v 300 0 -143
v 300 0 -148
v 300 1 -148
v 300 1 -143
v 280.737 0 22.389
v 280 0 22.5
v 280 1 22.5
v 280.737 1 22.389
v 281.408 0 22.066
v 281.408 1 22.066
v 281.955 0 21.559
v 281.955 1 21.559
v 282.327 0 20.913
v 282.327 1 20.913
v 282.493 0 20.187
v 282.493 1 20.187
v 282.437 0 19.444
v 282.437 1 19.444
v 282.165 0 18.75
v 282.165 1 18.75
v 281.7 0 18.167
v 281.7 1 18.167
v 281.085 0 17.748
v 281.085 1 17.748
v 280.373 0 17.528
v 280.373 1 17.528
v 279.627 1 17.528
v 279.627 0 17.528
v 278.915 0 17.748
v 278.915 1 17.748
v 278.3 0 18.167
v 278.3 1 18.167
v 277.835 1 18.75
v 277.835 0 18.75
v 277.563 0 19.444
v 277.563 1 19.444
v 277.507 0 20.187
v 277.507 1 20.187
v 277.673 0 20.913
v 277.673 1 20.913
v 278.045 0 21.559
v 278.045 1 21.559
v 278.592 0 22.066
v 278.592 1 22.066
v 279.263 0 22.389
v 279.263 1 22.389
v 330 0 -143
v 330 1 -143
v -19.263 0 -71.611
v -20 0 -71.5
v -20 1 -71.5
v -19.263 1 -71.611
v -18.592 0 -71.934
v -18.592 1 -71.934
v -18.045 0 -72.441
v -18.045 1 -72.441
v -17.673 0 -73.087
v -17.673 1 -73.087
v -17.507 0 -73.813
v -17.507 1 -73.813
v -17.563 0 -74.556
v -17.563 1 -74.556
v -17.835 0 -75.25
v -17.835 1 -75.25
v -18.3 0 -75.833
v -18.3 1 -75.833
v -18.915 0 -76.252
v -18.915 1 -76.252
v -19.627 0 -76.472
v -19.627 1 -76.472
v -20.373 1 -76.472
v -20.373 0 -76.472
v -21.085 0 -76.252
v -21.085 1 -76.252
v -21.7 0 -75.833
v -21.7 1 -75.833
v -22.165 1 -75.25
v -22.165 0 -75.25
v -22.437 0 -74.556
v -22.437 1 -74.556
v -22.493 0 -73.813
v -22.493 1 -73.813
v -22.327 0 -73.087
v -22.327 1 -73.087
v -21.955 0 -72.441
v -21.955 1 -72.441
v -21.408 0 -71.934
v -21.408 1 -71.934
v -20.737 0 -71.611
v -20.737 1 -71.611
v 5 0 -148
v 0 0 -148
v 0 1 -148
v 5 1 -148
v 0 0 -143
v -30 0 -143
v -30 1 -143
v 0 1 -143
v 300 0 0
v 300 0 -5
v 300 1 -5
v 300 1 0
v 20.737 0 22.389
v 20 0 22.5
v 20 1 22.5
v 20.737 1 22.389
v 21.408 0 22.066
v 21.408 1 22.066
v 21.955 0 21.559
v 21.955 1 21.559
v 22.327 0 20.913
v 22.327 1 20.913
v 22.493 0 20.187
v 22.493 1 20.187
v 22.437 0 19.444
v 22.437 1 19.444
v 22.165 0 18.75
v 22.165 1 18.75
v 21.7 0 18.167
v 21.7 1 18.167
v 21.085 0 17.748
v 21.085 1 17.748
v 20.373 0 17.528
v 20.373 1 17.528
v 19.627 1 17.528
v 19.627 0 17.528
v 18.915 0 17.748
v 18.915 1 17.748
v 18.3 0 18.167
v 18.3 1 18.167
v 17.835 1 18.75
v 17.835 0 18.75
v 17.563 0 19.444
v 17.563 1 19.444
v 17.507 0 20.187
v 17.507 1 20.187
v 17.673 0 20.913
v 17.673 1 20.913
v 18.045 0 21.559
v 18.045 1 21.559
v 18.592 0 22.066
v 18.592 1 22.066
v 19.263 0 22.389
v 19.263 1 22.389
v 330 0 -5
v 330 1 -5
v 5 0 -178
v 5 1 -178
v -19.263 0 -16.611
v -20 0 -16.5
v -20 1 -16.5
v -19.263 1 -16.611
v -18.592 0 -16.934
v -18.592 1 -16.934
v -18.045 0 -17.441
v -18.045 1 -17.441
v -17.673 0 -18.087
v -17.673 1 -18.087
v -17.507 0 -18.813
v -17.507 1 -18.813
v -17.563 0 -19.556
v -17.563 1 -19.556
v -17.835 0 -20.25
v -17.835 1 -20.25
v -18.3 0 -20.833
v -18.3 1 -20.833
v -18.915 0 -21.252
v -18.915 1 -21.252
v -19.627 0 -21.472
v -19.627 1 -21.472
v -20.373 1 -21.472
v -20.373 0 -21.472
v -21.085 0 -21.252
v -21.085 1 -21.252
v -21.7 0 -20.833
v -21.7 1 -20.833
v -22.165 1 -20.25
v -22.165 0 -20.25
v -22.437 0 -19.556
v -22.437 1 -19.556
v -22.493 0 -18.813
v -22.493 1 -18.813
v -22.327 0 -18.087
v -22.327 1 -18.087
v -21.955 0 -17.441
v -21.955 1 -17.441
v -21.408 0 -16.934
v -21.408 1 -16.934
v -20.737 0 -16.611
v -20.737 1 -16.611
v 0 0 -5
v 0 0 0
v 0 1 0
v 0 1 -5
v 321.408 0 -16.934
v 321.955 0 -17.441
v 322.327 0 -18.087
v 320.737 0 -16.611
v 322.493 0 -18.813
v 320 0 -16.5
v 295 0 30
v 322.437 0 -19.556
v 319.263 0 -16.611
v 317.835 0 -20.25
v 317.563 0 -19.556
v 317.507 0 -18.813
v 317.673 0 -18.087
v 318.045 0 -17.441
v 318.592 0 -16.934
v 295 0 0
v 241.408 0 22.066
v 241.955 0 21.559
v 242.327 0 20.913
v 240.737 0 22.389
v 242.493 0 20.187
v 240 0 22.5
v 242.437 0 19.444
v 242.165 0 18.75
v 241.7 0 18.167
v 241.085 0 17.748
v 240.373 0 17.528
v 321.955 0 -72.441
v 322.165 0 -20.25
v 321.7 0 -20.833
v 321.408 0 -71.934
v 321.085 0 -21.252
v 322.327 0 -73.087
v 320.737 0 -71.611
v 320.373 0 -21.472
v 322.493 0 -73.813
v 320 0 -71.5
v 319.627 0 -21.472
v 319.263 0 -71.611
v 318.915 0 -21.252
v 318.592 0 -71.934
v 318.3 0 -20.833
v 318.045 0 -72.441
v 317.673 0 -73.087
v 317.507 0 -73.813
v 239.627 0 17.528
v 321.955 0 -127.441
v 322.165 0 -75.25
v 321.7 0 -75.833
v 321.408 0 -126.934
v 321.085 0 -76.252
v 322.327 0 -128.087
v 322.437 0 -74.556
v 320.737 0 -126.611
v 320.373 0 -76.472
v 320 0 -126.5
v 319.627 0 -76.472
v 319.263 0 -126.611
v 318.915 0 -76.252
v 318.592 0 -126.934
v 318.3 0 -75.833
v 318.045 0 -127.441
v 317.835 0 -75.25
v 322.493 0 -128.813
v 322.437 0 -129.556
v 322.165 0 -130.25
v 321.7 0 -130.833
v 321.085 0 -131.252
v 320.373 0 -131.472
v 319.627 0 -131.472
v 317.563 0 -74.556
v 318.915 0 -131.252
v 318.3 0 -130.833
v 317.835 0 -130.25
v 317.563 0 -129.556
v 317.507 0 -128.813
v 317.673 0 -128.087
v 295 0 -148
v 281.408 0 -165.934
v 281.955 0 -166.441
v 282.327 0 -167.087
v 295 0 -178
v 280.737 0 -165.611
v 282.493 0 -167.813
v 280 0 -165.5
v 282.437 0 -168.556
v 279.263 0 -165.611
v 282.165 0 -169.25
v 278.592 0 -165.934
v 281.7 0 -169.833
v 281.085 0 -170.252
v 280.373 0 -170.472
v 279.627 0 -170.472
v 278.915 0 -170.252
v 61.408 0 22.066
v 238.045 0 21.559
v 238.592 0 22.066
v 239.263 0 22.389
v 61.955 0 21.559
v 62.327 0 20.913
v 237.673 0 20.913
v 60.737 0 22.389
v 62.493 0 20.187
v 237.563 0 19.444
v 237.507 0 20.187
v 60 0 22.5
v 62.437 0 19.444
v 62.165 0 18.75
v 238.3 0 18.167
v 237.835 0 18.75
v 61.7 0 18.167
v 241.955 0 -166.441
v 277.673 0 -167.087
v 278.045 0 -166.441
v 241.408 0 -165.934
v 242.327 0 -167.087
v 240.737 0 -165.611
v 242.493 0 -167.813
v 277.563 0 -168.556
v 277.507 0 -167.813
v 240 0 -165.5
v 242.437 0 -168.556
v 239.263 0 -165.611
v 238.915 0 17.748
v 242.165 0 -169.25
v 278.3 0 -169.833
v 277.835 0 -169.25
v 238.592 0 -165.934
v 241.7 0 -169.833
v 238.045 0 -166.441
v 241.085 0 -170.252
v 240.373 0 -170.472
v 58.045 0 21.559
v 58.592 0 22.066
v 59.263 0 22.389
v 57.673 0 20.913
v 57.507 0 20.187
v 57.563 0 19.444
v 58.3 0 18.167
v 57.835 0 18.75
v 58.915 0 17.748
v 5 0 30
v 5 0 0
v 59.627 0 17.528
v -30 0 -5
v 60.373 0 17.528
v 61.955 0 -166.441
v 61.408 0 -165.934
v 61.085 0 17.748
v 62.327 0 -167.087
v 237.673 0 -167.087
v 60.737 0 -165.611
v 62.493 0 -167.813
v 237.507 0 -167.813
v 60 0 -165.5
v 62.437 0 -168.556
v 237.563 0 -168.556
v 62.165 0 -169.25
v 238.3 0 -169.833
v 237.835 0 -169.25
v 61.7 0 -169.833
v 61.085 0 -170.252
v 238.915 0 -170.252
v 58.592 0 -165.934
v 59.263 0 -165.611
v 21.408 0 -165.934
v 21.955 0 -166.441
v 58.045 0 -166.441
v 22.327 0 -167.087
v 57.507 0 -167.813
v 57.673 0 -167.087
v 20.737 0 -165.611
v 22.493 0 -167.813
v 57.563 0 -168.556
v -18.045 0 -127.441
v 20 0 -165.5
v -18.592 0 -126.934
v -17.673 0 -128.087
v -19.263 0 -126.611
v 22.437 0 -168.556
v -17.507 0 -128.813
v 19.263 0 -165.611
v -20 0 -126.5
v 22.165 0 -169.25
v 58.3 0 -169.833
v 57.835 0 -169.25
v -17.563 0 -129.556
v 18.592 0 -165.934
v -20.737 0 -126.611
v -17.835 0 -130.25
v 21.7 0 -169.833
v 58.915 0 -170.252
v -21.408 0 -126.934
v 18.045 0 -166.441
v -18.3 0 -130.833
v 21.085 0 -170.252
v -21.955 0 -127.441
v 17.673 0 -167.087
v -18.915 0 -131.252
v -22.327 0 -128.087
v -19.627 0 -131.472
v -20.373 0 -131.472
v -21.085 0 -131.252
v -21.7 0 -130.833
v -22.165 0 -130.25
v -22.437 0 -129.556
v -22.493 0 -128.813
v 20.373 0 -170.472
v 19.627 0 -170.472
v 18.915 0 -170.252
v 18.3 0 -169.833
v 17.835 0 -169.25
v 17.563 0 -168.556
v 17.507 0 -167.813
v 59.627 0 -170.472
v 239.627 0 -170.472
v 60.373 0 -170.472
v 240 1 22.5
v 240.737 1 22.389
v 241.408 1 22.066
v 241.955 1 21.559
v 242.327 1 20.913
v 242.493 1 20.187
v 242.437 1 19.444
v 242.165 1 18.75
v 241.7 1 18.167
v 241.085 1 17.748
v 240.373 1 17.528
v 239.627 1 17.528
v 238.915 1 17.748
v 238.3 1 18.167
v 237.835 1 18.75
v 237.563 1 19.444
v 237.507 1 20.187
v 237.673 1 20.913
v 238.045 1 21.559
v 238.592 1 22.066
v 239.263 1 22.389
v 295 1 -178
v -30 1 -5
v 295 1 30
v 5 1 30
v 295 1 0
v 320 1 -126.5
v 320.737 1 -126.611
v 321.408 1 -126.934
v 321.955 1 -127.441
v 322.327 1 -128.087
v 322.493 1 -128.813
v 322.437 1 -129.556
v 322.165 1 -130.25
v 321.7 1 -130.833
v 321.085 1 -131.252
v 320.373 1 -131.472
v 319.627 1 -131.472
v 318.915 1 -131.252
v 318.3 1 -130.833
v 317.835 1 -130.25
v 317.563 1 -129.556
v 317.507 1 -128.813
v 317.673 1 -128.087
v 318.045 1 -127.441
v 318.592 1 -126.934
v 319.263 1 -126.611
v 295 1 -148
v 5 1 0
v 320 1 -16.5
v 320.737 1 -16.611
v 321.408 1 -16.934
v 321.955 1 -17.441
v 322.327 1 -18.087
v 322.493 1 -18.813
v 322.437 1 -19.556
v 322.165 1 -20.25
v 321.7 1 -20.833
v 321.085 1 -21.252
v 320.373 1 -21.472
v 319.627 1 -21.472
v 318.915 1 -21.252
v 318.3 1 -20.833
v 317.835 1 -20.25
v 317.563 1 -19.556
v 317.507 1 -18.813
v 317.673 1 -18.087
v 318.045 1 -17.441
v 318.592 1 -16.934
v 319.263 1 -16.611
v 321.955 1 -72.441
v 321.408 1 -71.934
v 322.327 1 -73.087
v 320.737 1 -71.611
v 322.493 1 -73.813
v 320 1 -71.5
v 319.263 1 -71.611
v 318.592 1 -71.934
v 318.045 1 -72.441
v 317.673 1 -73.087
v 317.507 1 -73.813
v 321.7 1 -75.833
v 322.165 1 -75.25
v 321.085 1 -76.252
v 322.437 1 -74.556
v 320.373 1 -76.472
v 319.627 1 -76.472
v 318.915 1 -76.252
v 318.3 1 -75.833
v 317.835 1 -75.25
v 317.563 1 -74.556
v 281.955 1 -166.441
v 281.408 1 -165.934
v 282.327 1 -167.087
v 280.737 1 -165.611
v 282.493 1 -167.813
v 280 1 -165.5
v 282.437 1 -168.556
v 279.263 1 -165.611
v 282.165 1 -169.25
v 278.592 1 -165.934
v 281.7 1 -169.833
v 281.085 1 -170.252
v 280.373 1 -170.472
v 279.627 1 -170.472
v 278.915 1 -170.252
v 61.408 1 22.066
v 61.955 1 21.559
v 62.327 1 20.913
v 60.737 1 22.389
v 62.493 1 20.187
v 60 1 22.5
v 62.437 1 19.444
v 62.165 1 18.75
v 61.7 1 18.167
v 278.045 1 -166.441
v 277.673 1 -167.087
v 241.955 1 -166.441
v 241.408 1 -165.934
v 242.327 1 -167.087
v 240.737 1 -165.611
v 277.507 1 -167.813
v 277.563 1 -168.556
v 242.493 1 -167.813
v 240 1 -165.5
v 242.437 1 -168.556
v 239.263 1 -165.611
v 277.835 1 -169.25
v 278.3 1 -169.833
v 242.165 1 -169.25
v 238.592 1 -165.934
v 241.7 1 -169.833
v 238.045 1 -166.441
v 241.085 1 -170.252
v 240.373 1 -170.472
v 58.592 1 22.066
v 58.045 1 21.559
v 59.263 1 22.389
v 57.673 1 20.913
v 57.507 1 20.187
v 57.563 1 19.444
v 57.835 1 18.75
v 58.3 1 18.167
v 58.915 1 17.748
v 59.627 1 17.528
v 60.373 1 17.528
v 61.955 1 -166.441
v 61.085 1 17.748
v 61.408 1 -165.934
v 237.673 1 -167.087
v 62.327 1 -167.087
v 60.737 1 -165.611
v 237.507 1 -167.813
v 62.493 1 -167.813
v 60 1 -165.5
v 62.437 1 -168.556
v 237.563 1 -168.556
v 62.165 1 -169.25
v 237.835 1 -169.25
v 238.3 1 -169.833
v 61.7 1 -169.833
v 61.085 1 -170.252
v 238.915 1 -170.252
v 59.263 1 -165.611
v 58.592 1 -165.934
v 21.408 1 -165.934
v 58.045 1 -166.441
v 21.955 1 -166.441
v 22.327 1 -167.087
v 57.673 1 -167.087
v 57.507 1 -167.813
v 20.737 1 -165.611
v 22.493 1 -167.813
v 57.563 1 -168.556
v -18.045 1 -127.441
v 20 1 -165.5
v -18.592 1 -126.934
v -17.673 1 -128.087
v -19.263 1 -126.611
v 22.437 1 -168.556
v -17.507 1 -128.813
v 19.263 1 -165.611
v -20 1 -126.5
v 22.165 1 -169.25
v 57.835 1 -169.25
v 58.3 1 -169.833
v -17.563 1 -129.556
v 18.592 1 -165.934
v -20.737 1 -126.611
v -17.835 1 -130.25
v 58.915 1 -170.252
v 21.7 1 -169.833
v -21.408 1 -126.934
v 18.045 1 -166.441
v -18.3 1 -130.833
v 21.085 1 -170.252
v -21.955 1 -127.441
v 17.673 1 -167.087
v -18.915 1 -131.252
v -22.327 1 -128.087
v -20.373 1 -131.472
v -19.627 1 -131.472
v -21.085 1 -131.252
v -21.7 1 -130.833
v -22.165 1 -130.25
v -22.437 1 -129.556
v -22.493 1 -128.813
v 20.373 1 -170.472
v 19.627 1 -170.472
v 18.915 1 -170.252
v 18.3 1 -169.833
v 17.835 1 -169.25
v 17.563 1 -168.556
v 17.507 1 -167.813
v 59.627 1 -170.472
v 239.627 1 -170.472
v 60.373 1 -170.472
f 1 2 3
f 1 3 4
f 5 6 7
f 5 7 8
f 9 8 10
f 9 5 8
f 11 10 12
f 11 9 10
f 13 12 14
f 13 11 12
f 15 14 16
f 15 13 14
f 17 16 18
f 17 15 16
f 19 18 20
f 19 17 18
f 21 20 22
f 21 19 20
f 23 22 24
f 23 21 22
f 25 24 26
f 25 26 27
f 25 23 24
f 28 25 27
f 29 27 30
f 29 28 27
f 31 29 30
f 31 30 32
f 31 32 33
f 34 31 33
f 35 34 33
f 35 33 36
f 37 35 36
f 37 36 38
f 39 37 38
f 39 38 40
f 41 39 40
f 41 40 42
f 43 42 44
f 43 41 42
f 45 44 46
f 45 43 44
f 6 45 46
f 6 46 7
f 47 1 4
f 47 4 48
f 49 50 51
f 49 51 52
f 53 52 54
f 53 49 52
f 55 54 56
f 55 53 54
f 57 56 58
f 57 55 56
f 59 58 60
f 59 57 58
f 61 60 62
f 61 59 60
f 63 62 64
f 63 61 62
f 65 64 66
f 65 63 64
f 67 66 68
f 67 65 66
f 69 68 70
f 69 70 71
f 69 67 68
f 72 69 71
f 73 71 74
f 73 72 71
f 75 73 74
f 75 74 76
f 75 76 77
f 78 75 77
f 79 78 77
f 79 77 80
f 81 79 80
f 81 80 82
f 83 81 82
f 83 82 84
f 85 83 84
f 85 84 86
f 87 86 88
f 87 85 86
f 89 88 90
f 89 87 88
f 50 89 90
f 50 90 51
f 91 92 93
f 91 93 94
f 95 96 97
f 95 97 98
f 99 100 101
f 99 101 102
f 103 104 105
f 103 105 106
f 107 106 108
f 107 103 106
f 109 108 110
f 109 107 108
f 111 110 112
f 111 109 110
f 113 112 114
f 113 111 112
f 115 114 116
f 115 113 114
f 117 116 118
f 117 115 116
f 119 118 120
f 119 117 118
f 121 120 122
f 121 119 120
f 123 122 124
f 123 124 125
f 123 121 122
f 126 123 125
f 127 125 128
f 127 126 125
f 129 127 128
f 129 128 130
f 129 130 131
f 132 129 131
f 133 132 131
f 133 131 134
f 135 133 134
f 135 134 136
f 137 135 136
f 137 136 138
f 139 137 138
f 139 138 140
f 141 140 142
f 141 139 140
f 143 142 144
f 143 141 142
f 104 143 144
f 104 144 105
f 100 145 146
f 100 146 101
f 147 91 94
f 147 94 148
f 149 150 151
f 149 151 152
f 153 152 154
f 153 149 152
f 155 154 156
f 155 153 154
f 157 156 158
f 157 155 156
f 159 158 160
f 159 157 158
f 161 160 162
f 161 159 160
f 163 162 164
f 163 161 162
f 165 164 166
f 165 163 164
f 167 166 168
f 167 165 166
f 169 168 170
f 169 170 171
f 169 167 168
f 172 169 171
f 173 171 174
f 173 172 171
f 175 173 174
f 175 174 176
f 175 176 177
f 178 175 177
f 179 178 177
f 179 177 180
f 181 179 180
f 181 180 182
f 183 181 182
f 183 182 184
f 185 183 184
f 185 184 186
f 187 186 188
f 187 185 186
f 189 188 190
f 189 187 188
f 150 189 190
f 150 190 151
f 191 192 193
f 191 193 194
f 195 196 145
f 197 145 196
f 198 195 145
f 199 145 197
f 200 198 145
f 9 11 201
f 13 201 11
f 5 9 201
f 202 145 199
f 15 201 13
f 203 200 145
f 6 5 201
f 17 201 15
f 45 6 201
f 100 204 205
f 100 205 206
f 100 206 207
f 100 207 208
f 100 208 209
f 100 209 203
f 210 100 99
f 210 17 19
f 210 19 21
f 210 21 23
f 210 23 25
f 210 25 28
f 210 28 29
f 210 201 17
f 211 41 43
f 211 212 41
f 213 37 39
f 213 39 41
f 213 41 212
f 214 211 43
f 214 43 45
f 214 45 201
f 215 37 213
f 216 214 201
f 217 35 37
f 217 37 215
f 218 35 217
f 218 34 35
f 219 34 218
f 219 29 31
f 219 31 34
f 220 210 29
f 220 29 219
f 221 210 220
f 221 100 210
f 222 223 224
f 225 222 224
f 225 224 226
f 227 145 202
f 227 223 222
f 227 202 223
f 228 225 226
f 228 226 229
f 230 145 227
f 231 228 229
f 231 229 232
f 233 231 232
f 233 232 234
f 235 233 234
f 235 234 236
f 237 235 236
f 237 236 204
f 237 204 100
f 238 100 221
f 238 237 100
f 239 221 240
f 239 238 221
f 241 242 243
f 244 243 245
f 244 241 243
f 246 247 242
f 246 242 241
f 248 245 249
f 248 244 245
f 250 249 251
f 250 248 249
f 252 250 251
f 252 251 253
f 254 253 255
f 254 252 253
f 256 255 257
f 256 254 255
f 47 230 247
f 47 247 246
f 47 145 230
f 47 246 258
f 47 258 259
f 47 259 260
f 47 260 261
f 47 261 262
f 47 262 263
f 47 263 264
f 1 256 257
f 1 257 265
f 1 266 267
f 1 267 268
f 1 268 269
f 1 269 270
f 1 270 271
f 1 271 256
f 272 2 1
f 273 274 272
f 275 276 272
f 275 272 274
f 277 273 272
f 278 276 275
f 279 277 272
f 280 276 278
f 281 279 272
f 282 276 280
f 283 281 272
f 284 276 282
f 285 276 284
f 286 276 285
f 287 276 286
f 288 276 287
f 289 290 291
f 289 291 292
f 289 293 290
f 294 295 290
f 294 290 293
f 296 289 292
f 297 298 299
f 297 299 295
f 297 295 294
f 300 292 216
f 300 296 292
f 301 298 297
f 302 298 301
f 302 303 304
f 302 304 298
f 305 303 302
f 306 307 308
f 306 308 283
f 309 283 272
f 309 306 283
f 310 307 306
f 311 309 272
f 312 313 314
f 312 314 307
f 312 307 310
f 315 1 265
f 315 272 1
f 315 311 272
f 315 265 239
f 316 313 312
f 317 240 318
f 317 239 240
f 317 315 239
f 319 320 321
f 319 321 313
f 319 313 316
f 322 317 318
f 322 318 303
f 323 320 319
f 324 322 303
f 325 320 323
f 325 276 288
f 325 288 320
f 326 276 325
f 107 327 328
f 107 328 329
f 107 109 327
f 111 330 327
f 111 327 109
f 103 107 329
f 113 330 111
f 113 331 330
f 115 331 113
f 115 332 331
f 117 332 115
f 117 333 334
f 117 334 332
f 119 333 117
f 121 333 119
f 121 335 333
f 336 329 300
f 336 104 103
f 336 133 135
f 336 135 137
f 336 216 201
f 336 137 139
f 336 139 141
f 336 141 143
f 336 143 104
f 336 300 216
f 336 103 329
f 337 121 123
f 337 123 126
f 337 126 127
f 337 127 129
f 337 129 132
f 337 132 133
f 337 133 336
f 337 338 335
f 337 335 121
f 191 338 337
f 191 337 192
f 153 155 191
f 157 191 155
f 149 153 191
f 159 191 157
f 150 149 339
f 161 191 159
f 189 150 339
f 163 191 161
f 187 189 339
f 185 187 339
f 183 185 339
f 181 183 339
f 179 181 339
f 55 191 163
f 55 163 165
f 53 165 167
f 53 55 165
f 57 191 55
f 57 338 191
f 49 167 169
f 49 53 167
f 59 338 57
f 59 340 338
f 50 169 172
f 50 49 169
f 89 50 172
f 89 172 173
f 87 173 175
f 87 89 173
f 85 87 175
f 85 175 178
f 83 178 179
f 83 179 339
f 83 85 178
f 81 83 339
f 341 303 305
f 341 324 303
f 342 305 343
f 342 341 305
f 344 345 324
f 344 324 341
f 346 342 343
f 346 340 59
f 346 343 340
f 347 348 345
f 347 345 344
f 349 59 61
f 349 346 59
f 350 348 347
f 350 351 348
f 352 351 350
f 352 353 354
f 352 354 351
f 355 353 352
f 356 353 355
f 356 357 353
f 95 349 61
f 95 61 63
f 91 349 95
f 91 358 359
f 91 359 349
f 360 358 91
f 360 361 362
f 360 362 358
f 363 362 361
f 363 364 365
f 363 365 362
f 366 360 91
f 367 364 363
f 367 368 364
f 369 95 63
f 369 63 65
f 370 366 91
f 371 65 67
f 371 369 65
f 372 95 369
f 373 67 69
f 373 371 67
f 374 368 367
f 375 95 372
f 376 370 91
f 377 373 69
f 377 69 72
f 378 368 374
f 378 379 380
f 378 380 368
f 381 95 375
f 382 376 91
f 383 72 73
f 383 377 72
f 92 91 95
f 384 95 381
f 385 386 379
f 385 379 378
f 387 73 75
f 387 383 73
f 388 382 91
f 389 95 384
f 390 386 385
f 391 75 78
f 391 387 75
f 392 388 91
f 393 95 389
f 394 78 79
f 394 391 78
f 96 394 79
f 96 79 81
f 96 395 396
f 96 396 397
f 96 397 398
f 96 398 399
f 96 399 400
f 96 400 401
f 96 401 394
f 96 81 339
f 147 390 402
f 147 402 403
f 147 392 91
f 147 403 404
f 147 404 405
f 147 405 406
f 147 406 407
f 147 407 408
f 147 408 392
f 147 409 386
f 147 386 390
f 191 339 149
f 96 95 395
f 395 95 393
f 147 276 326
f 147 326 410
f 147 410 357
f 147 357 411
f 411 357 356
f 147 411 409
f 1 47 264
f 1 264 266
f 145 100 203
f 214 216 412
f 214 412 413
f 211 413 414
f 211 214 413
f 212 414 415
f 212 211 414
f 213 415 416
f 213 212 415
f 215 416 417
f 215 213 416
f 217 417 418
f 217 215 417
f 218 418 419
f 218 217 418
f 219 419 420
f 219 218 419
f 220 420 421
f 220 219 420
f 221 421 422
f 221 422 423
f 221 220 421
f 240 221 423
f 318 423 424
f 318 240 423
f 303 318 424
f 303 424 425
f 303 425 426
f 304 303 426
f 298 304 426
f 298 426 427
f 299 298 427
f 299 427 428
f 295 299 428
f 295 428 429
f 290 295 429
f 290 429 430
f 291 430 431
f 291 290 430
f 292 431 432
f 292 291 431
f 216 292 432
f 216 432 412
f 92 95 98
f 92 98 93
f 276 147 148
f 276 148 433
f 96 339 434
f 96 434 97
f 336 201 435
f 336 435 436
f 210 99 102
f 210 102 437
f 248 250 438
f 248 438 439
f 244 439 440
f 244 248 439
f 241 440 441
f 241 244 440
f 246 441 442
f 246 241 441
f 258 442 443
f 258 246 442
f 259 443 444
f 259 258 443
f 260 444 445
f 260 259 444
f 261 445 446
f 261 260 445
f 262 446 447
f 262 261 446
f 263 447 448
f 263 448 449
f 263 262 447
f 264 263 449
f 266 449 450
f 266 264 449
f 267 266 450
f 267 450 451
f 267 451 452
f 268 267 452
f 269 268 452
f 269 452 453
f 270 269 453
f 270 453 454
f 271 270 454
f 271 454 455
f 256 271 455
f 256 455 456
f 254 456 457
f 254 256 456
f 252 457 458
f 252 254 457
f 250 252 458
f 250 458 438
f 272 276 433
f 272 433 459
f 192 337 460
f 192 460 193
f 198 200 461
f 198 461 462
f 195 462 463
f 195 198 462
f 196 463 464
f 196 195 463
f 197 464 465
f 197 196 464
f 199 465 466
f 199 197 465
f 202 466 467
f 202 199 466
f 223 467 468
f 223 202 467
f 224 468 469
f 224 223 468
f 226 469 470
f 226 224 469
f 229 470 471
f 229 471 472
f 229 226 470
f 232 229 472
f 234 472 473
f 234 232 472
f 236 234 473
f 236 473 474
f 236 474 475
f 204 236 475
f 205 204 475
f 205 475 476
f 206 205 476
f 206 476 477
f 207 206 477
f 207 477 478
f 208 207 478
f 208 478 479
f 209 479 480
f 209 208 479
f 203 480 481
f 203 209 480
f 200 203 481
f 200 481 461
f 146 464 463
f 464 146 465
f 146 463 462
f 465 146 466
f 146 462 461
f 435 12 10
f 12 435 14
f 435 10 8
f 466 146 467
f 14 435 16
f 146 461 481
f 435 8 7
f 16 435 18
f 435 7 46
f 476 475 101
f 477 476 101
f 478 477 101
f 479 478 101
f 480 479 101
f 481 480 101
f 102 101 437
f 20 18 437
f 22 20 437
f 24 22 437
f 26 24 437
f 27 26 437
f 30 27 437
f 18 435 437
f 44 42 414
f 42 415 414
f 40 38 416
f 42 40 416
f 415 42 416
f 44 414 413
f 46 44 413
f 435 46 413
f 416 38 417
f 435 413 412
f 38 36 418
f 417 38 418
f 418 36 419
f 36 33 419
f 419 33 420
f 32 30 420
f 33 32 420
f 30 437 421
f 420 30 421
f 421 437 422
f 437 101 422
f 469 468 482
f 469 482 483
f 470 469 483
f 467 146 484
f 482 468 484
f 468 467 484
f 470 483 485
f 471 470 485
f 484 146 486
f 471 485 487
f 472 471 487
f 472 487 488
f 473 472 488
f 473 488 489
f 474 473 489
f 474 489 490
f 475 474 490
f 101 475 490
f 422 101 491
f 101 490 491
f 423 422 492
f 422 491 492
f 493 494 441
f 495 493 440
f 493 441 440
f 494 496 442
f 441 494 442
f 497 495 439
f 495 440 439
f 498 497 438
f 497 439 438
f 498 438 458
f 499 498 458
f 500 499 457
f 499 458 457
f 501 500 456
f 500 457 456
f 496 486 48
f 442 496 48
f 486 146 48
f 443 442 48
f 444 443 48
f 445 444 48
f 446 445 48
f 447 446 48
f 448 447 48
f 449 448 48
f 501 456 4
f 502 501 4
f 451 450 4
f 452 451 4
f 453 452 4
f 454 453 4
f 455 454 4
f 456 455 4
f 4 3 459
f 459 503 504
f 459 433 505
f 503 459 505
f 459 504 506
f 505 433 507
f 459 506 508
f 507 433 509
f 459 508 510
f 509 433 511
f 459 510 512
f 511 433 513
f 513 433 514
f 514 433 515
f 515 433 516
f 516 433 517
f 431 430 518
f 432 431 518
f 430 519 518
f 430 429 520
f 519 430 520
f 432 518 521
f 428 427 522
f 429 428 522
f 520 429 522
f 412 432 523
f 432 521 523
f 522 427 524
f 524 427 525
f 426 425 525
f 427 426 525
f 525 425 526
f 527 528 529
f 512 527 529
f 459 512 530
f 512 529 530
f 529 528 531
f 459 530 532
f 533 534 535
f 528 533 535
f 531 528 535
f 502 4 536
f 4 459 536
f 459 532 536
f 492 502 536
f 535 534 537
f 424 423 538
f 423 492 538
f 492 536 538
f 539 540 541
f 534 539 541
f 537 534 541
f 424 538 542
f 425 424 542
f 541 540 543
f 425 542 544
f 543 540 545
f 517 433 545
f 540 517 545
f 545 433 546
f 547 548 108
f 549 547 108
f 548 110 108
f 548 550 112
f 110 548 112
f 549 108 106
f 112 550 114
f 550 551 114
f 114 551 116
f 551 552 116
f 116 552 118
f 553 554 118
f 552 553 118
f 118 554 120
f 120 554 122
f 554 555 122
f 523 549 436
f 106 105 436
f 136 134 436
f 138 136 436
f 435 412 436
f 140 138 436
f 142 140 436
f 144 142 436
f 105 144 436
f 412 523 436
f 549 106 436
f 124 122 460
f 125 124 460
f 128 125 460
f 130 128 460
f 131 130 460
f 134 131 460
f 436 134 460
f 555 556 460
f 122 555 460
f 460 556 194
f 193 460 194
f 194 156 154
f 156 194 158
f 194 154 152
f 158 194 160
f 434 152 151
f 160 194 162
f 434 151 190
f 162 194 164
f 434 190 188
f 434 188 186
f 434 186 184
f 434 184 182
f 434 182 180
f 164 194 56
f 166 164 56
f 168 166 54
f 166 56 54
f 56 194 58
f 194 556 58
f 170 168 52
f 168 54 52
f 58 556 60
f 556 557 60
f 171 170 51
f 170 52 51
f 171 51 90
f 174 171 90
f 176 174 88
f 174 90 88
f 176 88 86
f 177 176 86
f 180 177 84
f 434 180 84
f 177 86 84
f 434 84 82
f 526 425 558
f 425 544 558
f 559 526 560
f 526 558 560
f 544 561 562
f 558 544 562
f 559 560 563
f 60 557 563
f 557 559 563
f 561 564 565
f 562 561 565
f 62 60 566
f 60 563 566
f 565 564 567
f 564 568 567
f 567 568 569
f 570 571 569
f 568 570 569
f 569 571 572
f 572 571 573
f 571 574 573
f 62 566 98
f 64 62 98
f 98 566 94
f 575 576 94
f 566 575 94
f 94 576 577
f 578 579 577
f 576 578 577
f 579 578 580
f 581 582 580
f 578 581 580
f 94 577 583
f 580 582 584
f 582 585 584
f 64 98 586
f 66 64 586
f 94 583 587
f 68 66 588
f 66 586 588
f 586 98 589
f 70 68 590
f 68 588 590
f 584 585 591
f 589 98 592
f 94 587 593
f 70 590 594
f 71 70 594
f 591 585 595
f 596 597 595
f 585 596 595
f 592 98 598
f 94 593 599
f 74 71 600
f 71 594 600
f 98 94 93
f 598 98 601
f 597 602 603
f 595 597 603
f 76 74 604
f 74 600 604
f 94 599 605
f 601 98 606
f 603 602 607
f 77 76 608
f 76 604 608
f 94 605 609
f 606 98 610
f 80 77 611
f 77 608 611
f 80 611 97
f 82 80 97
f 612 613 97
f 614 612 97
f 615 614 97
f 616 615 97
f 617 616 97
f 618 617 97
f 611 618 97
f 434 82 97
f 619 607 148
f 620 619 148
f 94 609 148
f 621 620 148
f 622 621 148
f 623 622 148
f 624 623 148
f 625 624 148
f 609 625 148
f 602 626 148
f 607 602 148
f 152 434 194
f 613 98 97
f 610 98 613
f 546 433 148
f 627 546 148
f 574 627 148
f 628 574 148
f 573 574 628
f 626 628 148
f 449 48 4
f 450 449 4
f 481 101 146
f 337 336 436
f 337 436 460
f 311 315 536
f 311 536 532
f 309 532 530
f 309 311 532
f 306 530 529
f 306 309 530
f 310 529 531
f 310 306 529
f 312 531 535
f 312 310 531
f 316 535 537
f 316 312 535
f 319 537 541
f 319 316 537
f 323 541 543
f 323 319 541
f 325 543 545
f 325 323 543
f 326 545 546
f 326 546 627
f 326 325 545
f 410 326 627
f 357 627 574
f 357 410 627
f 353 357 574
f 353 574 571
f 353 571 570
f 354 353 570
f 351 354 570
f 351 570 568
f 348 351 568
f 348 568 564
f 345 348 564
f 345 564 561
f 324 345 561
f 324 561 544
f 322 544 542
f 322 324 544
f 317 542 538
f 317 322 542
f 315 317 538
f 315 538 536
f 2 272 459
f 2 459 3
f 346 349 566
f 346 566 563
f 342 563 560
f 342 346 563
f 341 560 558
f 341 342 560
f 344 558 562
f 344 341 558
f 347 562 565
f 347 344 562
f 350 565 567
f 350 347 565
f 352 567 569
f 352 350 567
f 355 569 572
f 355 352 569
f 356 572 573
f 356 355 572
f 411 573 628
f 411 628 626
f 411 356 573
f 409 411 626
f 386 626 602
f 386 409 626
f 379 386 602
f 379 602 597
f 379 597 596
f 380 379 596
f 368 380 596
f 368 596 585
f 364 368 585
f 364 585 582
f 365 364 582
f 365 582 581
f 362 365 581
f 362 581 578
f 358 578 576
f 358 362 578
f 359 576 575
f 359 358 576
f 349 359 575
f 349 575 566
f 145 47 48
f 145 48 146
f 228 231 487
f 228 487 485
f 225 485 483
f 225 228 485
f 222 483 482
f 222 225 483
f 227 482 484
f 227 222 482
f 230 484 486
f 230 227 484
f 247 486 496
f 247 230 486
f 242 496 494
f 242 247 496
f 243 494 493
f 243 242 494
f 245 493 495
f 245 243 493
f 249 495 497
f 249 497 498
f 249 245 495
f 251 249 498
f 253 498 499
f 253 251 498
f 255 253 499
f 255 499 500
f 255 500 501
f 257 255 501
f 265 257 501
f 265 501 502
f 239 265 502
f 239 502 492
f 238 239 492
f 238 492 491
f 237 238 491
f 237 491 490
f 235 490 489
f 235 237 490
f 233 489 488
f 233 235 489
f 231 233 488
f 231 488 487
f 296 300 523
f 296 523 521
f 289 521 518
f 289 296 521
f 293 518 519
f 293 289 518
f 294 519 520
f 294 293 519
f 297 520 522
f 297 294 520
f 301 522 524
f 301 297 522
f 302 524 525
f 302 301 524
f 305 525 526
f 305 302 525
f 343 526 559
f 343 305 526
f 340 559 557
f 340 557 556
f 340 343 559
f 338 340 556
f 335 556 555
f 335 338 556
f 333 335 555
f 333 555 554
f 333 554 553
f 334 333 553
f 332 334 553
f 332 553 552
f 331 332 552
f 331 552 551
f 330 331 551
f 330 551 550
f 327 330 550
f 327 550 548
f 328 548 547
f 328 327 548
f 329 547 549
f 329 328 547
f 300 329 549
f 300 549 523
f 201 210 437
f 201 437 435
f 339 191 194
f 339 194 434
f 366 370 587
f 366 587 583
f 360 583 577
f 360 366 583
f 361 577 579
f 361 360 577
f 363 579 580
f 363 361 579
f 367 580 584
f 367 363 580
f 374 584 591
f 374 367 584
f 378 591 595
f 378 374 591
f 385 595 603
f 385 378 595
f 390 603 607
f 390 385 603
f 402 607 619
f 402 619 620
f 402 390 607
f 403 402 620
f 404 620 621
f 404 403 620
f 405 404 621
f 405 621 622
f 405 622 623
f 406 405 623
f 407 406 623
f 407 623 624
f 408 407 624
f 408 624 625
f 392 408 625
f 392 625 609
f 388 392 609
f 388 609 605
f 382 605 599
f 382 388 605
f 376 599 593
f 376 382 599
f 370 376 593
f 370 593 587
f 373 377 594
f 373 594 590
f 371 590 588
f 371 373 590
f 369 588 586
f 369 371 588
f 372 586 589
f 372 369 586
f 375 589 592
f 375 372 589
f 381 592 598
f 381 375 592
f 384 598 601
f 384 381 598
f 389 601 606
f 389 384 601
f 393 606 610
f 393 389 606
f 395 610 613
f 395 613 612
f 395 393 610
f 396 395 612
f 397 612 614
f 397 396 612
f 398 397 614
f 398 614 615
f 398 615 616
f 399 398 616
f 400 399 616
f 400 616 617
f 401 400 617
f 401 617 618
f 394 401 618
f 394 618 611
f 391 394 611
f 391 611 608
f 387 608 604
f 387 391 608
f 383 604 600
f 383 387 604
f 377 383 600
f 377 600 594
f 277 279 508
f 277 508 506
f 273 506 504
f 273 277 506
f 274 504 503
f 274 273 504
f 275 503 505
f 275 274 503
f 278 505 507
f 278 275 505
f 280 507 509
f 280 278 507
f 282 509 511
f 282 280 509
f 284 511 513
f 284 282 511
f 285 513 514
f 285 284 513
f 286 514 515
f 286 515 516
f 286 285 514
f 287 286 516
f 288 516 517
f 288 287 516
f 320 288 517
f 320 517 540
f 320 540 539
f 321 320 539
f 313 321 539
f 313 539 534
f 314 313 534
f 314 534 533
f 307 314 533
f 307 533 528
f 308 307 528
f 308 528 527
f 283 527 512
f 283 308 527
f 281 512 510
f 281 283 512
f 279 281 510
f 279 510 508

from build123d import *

# Parameters (mm, degrees)
SKETCH1_R           = 2.5
BOSS_EXTRUDE1_DEPTH = 1


with BuildPart() as part:
    # Sketch1 → Boss-Extrude1 (new body)
    with BuildSketch(Plane(origin=(0, 0, 0), x_dir=(1, 0, 0), z_dir=(0, 1, 0))):
        Polygon((0, 0), (0, 5), (-30, 5), (-30, 143), (0, 143), (0, 148), (5, 148), (5, 178), (295, 178), (295, 148), (300, 148), (300, 143), (330, 143), (330, 5), (300, 5), (300, 0), (295, 0), (295, -30), (5, -30), (5, 0), align=None)
        with Locations(Location((20, -20, 0), (0, 0, 270))):
            Circle(SKETCH1_R, mode=Mode.SUBTRACT)
        with Locations(Location((60, -20, 0), (0, 0, 270))):
            Circle(SKETCH1_R, mode=Mode.SUBTRACT)
        with Locations(Location((280, -20, 0), (0, 0, 270))):
            Circle(SKETCH1_R, mode=Mode.SUBTRACT)
        with Locations(Location((240, -20, 0), (0, 0, 270))):
            Circle(SKETCH1_R, mode=Mode.SUBTRACT)
        with Locations(Location((320, 19, 0), (0, 0, 270))):
            Circle(SKETCH1_R, mode=Mode.SUBTRACT)
        with Locations(Location((320, 129, 0), (0, 0, 270))):
            Circle(SKETCH1_R, mode=Mode.SUBTRACT)
        with Locations(Location((280, 168, 0), (0, 0, 270))):
            Circle(SKETCH1_R, mode=Mode.SUBTRACT)
        with Locations(Location((240, 168, 0), (0, 0, 270))):
            Circle(SKETCH1_R, mode=Mode.SUBTRACT)
        with Locations(Location((60, 168, 0), (0, 0, 270))):
            Circle(SKETCH1_R, mode=Mode.SUBTRACT)
        with Locations(Location((20, 168, 0), (0, 0, 270))):
            Circle(SKETCH1_R, mode=Mode.SUBTRACT)
        with Locations(Location((-20, 129, 0), (0, 0, 270))):
            Circle(SKETCH1_R, mode=Mode.SUBTRACT)
        with Locations(Location((-20, 19, 0), (0, 0, 270))):
            Circle(SKETCH1_R, mode=Mode.SUBTRACT)
        with Locations(Location((-20, 74, 0), (0, 0, 270))):
            Circle(SKETCH1_R, mode=Mode.SUBTRACT)
        with Locations(Location((320, 74, 0), (0, 0, 270))):
            Circle(SKETCH1_R, mode=Mode.SUBTRACT)
    extrude(amount=BOSS_EXTRUDE1_DEPTH)


solid = part.part
